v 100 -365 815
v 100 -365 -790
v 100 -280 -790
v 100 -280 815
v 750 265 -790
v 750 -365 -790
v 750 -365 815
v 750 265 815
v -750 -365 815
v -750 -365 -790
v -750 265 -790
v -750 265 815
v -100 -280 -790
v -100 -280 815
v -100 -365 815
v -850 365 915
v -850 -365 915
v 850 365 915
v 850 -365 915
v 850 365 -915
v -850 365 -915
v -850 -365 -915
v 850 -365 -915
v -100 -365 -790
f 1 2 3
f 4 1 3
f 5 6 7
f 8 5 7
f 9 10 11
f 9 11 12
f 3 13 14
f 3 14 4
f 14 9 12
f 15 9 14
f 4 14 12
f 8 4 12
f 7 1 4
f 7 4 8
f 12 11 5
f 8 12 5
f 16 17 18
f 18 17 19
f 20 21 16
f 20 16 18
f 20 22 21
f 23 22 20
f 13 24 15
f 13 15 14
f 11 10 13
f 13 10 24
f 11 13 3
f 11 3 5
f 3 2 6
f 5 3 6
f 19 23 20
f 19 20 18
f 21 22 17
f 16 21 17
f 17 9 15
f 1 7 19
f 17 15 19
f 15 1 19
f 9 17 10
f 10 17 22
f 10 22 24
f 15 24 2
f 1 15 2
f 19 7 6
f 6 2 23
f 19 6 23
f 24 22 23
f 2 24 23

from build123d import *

# Parameters (mm, degrees)
F0_W     = 1700
F0_H     = 1830
F1_DEPTH = 365
F2_W     = 1500
F2_H     = 1630
F3_DEPTH = 630
F4_DEPTH = 25
F5_W     = 200
F5_H     = 85
F6_DEPTH = 1630


with BuildPart() as f1:
    # F0 (on Front) → F1 (new body, symmetric)
    with BuildSketch(Plane.XZ):
        Rectangle(F0_W, F0_H)
    extrude(amount=F1_DEPTH, both=True)

    # F2 (on face) → F3 (cut)
    with BuildSketch(Plane.XZ.offset(365)):
        Rectangle(F2_W, F2_H)
    extrude(amount=-F3_DEPTH, mode=Mode.SUBTRACT)

    # F4 (add): a face of the model
    f4_faces = [f1.faces().sort_by_distance(p)[0] for p in [
        (0, -50, -815),
    ]]
    extrude(f4_faces, amount=F4_DEPTH)

    # F5 (on face) → F6 (join)
    with BuildSketch(Plane.XY.offset(-790)):
        with Locations((0, -322.5)):
            Rectangle(F5_W, F5_H)
    extrude(amount=F6_DEPTH)


solid = f1.part
